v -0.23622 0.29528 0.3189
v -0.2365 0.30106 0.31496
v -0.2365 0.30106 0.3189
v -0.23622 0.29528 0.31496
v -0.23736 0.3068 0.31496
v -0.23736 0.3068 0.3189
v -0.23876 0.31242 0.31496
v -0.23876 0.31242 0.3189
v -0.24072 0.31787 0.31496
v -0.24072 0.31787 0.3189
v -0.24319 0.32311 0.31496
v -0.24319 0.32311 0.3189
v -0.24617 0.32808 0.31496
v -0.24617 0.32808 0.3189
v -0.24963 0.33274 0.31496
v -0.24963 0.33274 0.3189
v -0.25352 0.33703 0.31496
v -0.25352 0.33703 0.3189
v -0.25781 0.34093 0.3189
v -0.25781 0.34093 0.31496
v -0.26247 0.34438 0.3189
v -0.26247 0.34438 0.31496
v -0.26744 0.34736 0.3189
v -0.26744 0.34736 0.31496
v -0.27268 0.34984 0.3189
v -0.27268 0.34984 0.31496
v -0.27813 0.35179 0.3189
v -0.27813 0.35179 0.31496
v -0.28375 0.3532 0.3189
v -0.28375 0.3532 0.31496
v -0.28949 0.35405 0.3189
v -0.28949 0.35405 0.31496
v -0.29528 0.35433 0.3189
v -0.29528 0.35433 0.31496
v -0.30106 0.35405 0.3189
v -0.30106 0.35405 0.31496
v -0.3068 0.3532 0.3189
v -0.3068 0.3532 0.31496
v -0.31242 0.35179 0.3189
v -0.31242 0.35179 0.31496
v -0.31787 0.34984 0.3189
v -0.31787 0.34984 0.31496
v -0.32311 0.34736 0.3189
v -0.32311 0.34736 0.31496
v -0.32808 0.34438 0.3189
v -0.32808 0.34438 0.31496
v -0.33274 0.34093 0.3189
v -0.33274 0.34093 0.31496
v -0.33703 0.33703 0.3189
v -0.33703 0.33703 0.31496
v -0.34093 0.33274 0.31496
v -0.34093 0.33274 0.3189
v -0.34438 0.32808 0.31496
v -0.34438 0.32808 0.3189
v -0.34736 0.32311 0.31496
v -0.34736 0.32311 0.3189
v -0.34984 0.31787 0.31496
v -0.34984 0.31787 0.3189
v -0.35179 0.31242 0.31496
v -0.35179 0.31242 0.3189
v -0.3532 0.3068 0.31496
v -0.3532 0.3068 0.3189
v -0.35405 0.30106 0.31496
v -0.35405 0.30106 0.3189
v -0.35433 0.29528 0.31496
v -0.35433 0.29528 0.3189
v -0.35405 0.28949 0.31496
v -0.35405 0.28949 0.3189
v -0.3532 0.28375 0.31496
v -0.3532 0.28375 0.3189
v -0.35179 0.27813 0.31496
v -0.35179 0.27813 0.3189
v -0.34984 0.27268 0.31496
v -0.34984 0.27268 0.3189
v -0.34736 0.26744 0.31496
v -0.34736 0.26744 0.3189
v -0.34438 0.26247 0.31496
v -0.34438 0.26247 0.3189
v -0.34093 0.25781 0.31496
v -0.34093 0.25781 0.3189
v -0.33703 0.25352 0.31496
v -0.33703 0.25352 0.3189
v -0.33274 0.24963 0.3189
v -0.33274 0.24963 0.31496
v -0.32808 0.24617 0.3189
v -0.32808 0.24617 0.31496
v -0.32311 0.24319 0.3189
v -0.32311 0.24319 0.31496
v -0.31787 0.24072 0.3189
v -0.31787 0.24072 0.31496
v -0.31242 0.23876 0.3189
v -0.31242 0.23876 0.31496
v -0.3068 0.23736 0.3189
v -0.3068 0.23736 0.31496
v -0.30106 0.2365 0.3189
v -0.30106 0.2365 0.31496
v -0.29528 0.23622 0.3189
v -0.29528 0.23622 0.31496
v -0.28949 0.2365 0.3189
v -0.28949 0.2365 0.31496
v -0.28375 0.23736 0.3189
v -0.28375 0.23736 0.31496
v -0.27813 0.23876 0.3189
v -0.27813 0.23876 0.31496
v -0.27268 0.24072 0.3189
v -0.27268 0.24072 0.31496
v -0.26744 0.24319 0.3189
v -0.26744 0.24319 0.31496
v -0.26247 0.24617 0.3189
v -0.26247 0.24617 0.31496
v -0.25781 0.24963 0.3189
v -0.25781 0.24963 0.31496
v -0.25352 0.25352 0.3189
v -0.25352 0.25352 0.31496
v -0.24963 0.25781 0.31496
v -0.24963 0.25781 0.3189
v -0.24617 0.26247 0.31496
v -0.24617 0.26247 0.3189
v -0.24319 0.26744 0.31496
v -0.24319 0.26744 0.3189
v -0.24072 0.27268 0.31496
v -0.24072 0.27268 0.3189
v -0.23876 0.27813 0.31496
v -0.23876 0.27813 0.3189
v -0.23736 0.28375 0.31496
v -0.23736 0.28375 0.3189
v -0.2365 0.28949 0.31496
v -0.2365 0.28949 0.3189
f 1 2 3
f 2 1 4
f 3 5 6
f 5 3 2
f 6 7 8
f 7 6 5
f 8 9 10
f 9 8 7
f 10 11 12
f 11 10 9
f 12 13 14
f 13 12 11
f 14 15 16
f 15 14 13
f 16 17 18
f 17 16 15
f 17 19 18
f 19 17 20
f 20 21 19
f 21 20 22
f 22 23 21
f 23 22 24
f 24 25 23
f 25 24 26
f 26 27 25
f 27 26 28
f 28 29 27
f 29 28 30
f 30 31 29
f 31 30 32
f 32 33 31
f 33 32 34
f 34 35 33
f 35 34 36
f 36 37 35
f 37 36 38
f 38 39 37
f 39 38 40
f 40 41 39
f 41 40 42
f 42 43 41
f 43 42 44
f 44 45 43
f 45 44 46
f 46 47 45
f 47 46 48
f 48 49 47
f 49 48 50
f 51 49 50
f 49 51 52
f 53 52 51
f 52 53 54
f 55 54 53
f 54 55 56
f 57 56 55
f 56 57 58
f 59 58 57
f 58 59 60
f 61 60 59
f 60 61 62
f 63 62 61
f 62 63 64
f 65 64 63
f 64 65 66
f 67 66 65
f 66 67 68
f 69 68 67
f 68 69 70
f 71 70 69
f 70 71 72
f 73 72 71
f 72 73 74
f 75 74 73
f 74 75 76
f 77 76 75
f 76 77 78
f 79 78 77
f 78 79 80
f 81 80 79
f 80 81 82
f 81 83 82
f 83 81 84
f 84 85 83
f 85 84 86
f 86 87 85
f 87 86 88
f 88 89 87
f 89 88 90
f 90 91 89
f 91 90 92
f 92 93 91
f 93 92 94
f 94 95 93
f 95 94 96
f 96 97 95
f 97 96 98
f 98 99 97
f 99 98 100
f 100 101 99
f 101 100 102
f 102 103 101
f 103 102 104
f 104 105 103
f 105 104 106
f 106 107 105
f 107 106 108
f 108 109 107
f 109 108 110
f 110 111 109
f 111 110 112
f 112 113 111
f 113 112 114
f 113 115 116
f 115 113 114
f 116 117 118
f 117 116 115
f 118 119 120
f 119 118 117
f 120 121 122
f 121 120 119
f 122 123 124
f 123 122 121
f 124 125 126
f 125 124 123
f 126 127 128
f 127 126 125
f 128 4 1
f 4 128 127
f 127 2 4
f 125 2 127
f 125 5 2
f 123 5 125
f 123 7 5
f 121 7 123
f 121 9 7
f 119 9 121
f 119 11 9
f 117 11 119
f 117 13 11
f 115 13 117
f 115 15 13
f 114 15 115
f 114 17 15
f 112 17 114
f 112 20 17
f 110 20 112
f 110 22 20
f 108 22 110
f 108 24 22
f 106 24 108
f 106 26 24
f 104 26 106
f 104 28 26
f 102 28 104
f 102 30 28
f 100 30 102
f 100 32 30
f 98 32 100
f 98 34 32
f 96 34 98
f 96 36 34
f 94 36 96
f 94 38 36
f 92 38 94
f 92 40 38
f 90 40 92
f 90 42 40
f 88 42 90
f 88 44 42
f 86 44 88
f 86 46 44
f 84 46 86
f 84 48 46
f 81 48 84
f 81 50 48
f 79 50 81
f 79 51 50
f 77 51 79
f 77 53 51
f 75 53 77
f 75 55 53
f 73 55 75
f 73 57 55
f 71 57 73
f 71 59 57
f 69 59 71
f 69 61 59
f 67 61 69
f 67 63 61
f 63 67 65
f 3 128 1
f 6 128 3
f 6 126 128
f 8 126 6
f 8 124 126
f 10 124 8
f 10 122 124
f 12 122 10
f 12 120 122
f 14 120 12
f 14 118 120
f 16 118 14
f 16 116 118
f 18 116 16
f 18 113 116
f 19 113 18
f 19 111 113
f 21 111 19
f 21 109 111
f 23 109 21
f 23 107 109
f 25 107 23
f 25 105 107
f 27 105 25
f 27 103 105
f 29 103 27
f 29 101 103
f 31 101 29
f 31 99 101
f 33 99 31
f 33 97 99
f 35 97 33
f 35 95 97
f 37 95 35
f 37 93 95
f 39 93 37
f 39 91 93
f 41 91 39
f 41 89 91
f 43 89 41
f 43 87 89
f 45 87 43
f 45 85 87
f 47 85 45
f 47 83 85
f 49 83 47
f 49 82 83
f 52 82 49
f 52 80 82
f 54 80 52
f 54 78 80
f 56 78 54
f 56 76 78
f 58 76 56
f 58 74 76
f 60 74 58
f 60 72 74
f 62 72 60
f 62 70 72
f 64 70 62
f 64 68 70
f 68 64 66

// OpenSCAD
// file: defines.scad
L = 2.0;  // Длина
W = 2.0;  // Ширина
H = 0.8;  // Высота (от платы, с выводами)
Hf = 0.04;  // Возвышение над платой (высота выводов)
e = 0.5;    // Шаг выводов

pin_fragments = 16;

scale = 1/2.54;
// main file
include <defines.scad>

font = "Liberation Sans";
/*font = "DejaVu";*/
/*font = "Abyssinica SIL";*/

f_x = -0.5;
f_y = 1.2;
f_dy = -0.4;
fscale = 0.03;
lab_h = 0.01;

// Label
scale(scale) color("White") {

    /*translate([f_x, f_y+f_dy, H]) {
        scale([fscale,fscale,1])
        linear_extrude(height = lab_h, center=false) {
            text("Texas", font = font);
        }
    }
    translate([f_x, f_y+2*f_dy, H]) {
        scale([fscale,fscale,1])
        linear_extrude(height = lab_h, center=false) {
            text("Instruments", font = font);
        }
    }*/

    translate([-0.75, 0.75, H]) {
        cylinder(r = 0.15, h = lab_h, $fn = 64);
    }

}
